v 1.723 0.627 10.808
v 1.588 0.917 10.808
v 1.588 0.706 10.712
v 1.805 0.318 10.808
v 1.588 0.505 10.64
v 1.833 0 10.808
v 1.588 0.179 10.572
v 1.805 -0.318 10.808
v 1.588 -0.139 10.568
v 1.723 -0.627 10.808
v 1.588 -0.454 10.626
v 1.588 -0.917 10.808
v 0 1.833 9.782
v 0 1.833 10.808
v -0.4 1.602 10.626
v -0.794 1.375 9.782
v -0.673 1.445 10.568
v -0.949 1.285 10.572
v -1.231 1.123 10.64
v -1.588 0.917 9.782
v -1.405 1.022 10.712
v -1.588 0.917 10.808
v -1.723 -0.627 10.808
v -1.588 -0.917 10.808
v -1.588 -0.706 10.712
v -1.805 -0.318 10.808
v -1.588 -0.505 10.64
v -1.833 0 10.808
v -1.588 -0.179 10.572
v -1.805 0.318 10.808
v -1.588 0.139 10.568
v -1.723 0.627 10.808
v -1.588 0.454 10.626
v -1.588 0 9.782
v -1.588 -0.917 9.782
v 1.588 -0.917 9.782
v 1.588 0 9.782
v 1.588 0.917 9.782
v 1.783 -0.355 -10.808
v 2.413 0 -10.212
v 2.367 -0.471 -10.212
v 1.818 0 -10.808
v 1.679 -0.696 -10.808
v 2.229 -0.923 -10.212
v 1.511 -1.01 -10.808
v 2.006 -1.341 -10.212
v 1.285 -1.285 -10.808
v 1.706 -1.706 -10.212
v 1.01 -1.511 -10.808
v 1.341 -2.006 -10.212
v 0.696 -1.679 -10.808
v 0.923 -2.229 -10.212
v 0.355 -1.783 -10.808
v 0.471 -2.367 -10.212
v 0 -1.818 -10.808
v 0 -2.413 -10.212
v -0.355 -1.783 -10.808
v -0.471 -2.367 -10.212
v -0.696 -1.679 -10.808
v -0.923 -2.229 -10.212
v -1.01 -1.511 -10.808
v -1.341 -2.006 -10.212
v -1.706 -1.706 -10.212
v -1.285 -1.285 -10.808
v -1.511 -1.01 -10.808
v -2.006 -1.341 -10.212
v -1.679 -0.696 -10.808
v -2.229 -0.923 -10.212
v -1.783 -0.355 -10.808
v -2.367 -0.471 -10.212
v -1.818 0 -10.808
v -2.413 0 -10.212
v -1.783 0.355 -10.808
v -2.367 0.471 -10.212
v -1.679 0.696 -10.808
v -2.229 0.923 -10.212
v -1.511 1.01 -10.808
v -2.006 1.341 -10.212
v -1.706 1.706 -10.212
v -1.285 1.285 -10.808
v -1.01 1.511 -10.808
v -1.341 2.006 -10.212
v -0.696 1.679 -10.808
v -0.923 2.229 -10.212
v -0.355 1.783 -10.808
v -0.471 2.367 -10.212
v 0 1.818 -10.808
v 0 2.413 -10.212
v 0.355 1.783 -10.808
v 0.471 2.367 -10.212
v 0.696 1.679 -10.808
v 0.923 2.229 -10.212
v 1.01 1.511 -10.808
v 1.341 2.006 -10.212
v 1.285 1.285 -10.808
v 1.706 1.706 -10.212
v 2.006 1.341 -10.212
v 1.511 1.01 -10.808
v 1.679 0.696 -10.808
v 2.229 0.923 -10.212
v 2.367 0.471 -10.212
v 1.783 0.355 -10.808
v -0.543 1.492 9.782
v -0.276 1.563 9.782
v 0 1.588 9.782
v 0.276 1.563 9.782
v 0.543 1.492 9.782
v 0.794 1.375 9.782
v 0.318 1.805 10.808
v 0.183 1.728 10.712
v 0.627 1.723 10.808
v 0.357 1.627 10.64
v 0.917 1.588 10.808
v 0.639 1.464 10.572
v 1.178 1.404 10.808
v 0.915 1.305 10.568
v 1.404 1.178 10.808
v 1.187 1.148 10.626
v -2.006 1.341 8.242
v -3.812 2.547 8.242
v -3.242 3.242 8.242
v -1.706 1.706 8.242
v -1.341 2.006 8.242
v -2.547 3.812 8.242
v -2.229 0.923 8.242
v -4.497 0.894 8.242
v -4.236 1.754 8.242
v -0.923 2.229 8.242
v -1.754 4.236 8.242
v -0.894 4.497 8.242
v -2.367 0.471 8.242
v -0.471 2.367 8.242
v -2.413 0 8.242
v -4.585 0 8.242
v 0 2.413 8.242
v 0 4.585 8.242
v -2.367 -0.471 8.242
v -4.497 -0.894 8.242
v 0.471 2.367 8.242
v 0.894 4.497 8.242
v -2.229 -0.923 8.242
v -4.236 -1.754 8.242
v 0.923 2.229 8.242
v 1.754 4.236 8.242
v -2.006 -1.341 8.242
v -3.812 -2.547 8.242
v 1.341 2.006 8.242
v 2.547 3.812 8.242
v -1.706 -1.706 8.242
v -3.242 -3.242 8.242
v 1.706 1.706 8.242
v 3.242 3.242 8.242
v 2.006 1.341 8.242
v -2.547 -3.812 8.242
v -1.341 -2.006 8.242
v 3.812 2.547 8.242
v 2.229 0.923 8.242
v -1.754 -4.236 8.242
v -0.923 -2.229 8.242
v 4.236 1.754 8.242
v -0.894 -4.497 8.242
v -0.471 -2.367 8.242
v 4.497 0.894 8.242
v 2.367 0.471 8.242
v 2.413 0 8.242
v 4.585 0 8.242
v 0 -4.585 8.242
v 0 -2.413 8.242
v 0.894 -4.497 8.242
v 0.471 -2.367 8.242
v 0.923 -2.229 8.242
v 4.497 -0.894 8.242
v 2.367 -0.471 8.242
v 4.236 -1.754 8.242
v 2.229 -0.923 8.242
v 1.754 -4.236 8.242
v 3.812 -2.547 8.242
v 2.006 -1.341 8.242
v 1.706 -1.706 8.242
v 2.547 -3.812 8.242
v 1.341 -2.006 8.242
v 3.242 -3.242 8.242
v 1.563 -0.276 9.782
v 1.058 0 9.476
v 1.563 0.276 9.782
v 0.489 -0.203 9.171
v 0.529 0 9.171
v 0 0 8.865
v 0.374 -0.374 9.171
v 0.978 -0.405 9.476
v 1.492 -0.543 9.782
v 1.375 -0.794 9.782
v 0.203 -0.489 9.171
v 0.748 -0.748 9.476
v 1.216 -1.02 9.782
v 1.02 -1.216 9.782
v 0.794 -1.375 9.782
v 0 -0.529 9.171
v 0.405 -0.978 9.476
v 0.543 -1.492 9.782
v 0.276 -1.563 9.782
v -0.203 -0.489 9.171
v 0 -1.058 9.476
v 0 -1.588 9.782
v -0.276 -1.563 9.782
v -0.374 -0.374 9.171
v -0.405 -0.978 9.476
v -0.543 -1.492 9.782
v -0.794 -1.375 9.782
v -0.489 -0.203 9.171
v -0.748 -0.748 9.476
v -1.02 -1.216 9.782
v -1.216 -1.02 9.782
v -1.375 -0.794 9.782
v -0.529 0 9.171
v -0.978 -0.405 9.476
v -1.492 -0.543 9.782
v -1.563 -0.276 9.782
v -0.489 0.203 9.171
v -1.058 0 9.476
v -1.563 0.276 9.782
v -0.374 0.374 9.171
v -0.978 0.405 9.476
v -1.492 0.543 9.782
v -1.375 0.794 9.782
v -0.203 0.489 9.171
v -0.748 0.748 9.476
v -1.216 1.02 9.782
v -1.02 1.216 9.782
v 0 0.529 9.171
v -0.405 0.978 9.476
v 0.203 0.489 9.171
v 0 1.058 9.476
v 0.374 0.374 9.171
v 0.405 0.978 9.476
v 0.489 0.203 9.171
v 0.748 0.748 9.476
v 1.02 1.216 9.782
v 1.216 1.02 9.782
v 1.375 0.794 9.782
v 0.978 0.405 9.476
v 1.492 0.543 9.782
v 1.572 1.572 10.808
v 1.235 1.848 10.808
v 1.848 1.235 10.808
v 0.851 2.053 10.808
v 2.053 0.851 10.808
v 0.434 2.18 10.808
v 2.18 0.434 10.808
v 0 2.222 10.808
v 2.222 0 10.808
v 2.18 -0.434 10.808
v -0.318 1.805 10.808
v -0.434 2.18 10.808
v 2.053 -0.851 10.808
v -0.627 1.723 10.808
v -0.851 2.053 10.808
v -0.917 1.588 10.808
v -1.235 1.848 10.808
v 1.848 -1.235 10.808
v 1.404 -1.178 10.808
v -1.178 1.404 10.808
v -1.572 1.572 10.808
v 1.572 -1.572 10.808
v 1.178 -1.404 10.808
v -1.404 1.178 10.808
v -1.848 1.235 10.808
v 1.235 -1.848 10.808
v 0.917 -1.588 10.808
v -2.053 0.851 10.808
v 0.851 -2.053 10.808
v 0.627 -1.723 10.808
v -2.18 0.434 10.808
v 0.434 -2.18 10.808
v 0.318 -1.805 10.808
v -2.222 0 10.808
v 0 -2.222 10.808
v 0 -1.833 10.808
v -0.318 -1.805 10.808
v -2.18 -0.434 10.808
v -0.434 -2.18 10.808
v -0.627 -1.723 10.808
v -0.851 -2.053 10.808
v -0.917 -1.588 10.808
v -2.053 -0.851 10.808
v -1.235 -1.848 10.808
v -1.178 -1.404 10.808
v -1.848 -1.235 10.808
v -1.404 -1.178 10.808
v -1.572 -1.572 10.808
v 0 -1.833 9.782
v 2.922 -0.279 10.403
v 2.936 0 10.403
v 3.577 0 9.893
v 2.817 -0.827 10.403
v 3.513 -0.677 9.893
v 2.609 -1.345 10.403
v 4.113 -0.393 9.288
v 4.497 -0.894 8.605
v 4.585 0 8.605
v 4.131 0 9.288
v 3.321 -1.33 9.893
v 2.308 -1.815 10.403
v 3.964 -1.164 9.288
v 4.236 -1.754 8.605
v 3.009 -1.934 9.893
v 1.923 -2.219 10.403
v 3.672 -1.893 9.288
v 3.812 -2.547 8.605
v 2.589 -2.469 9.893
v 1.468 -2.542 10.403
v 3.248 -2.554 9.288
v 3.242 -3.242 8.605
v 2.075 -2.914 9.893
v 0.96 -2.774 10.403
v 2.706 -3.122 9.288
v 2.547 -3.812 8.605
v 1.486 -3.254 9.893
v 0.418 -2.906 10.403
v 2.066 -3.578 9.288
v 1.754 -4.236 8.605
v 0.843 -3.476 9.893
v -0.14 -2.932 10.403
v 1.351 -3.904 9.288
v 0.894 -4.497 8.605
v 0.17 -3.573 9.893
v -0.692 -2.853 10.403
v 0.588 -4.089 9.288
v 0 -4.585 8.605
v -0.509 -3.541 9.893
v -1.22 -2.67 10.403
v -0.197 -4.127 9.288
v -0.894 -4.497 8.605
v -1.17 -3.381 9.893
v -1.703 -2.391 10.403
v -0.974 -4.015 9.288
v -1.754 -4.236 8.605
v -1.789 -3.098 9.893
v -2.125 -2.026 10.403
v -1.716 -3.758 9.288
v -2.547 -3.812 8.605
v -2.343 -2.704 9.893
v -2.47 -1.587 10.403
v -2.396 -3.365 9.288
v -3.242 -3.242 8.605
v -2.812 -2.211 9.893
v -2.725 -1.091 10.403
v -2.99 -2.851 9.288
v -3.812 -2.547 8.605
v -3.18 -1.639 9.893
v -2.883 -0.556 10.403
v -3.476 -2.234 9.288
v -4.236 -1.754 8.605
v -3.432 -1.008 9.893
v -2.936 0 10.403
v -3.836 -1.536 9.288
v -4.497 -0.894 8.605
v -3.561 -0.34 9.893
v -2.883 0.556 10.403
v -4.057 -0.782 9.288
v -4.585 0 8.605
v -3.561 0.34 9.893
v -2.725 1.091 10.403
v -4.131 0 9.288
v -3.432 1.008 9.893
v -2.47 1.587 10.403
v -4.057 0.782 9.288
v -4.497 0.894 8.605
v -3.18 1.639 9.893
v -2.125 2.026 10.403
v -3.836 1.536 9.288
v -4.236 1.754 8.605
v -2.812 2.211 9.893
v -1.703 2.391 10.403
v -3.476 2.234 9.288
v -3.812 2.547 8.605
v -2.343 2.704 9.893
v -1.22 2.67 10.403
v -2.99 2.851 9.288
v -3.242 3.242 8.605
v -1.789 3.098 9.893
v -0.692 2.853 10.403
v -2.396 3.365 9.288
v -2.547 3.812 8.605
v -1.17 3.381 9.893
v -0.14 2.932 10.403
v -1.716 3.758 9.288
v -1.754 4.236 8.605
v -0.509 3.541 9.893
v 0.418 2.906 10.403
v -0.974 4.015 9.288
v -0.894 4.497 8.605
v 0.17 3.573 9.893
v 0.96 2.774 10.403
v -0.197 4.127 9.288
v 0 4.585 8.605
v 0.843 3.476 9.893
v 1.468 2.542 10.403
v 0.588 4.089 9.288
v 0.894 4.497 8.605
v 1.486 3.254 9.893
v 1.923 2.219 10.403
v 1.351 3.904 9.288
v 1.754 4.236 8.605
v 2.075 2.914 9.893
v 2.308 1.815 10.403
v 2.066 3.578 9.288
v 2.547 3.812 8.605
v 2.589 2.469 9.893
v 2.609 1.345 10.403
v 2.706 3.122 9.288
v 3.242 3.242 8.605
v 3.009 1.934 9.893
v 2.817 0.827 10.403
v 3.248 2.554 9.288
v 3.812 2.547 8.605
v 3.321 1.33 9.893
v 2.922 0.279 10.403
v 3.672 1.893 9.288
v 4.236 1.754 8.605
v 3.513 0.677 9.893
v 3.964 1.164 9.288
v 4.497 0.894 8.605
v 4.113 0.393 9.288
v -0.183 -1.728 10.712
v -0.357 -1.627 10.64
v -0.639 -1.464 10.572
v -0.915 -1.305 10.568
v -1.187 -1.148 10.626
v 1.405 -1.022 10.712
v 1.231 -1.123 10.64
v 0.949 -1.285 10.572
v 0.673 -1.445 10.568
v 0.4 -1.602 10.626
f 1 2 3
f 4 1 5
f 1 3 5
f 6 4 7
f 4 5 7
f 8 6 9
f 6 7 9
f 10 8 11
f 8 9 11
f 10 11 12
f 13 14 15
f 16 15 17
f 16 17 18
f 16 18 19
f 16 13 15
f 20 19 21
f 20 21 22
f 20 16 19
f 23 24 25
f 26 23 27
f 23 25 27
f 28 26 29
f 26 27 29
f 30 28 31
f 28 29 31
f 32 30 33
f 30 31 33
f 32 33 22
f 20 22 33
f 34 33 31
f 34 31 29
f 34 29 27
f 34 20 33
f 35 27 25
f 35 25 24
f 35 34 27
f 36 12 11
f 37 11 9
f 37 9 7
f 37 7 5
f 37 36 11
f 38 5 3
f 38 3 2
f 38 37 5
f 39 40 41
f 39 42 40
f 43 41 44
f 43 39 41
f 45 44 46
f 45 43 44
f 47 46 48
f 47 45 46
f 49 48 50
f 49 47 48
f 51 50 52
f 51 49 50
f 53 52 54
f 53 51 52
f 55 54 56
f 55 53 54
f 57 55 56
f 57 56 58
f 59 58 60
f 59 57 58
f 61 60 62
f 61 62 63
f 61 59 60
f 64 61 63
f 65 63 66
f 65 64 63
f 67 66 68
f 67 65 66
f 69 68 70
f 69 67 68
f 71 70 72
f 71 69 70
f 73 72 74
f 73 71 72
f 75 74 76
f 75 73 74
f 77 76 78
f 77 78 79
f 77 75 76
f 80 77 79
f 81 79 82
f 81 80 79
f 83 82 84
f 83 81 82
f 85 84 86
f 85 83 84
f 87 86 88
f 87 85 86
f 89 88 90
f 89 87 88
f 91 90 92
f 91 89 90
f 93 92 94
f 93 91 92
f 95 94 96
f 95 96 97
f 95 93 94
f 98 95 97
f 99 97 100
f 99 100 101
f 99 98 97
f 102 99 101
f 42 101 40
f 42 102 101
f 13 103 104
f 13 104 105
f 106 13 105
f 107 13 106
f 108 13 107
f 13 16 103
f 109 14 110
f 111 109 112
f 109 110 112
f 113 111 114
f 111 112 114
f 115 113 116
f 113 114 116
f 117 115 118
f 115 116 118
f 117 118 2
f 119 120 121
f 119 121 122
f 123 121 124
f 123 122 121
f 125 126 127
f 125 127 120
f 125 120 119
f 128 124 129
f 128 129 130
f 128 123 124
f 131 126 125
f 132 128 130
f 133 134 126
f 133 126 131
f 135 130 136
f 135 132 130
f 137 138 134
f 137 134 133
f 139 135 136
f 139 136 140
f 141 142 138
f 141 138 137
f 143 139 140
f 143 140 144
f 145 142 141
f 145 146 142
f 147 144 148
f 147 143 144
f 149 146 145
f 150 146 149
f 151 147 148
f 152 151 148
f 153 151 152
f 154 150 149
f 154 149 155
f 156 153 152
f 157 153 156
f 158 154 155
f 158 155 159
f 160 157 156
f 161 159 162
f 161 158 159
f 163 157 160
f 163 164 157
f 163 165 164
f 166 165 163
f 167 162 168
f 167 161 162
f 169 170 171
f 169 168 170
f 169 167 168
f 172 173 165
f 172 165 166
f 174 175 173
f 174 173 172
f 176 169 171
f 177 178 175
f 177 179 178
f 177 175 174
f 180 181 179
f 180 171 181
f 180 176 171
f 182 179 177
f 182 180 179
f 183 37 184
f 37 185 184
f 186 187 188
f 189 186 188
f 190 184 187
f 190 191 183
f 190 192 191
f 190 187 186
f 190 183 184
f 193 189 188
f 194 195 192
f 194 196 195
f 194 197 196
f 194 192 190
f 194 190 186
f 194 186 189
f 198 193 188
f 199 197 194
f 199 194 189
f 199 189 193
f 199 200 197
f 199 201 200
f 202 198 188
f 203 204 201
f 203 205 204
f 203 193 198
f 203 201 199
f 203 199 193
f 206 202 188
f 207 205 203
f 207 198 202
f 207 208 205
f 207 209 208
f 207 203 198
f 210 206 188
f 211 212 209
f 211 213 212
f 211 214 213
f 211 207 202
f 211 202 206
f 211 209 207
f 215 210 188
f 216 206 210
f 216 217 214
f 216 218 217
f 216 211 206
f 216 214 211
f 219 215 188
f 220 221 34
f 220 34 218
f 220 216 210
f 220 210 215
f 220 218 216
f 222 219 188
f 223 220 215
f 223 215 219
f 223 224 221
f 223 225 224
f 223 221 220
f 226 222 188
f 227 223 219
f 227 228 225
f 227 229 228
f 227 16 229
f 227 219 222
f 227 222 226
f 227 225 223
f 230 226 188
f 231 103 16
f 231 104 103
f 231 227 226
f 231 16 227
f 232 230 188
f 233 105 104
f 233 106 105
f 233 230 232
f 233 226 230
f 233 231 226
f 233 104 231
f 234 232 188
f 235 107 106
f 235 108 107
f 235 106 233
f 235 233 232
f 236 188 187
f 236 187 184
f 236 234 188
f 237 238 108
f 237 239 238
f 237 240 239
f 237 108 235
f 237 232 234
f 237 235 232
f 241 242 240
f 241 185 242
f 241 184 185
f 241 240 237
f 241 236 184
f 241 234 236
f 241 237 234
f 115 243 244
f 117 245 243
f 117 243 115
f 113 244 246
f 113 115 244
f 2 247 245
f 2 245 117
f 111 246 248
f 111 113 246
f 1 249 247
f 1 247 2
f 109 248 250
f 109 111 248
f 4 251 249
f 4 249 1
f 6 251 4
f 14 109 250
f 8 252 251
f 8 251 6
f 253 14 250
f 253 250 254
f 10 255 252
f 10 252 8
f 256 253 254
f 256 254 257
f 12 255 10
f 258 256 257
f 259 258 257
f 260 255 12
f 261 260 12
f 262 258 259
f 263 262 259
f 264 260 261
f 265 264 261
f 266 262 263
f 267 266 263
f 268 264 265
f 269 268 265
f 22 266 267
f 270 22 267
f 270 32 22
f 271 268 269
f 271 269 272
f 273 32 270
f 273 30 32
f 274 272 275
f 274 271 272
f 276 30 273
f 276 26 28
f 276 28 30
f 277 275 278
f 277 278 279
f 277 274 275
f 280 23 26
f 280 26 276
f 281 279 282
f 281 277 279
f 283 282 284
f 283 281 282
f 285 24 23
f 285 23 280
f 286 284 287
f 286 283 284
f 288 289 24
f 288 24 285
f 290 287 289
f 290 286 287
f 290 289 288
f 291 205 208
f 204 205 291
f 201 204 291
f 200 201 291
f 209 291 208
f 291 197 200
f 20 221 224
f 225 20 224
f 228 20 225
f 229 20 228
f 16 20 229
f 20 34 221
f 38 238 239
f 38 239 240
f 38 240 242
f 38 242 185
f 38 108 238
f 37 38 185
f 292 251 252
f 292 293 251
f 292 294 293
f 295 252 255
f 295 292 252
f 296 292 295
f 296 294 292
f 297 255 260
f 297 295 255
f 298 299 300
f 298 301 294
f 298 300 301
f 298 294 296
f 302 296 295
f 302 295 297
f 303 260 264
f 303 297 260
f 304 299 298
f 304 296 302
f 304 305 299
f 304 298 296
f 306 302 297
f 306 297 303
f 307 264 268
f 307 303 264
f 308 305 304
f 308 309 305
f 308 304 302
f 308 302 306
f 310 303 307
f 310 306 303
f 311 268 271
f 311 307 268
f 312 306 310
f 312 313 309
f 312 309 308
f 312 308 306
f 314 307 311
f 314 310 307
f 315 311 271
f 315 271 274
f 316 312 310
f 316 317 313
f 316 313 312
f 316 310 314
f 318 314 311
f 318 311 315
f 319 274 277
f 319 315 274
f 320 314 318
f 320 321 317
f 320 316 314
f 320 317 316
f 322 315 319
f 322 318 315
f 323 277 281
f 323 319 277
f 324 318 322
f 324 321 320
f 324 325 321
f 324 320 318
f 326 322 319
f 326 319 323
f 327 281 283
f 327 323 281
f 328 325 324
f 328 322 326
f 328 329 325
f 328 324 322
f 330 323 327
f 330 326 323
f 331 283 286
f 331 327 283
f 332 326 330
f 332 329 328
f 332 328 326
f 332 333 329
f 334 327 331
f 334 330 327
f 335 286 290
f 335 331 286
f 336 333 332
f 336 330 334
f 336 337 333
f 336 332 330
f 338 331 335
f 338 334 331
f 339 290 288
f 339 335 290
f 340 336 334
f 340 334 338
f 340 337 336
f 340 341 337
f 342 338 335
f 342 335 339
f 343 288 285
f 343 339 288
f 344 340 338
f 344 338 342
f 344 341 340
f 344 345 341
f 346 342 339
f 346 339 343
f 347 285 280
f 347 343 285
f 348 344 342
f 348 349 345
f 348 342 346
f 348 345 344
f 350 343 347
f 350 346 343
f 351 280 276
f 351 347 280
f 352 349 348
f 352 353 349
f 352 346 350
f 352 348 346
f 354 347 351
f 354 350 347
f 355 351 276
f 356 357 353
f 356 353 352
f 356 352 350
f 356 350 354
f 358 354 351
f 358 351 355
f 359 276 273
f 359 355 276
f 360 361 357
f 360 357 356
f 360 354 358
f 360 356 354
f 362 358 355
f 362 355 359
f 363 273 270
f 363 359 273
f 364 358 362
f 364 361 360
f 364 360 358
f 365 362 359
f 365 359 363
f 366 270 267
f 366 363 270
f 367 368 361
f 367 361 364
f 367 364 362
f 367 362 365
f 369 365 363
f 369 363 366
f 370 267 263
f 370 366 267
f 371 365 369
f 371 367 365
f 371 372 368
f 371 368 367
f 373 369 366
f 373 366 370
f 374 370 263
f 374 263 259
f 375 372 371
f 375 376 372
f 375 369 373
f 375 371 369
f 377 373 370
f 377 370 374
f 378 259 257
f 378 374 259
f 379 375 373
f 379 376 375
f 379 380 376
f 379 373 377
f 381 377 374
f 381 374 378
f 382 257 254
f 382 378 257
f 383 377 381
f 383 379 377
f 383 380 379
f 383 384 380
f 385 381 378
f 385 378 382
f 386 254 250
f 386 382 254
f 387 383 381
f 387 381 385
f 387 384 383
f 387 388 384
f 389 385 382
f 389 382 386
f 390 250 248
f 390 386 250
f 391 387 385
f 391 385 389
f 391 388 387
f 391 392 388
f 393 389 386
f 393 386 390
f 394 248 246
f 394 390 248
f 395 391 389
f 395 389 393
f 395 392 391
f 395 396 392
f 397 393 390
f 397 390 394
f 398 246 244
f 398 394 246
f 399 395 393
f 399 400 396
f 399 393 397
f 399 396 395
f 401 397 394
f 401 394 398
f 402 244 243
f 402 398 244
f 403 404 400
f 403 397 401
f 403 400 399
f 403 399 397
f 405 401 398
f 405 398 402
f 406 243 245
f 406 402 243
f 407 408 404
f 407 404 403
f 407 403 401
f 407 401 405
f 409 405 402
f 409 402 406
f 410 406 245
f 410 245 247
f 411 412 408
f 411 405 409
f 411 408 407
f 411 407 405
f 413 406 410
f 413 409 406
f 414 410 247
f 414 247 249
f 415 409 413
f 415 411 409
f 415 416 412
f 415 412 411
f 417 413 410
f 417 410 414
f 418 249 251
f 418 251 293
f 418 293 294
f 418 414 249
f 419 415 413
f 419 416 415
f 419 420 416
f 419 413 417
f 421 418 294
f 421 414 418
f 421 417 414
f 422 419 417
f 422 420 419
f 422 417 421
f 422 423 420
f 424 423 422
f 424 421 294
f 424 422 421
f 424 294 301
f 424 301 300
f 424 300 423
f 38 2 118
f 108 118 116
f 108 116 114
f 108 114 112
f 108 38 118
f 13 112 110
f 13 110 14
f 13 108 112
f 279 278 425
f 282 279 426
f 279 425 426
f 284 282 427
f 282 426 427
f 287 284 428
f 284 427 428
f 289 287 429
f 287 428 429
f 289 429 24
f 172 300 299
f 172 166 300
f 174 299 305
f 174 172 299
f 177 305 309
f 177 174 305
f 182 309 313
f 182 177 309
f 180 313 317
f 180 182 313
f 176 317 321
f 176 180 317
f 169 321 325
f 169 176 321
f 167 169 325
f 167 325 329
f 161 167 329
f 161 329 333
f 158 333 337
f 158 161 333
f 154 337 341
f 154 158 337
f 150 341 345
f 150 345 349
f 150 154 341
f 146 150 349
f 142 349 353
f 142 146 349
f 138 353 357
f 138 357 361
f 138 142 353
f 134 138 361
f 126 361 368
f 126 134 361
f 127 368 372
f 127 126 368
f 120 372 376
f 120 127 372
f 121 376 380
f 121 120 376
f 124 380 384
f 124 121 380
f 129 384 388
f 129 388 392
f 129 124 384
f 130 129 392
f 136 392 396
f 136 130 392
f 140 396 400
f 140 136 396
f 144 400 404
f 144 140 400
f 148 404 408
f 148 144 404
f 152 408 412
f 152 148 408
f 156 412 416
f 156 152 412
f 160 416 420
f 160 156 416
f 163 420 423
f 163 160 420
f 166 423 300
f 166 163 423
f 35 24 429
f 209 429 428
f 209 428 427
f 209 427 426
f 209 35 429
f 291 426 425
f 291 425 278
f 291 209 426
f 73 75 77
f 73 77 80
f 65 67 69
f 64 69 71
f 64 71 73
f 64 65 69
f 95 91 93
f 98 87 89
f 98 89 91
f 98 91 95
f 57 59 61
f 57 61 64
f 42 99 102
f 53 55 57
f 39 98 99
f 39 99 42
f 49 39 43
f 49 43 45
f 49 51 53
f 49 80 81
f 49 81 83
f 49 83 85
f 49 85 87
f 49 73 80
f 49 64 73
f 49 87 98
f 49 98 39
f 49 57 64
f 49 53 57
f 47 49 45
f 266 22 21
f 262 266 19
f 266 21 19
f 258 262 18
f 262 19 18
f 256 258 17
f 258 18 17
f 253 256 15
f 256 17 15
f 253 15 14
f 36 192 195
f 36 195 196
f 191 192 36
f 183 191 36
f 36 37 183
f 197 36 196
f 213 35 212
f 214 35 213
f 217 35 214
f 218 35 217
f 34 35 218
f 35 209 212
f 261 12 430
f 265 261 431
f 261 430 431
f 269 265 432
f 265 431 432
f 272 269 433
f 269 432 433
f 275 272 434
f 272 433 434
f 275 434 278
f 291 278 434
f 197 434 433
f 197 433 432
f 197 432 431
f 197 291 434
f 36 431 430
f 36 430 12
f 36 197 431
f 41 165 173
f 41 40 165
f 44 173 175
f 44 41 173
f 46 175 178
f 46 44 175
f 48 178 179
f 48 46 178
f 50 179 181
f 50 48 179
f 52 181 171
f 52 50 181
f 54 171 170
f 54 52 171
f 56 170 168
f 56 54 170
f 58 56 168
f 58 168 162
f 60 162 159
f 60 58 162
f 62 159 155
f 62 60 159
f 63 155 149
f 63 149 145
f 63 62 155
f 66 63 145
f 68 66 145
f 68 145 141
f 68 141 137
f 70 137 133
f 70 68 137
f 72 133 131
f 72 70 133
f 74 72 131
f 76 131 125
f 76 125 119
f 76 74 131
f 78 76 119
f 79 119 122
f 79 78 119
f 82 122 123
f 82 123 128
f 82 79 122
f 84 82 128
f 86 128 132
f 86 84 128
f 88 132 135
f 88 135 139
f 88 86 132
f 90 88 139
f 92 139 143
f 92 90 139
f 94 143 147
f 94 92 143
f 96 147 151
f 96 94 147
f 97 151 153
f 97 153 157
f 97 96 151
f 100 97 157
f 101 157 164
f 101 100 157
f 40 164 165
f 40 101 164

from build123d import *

# Parameters (mm, degrees)
CUT_EXTRUDE1_START = 9.78154
CUT_EXTRUDE1_DEPTH = 3.821845556


with BuildPart() as part:
    # Sketch2 → Revolve1 (revolve)
    with BuildSketch(Plane(origin=(0, 0, 0), x_dir=(0, 0, -1), z_dir=(1, 0, 0)), mode=Mode.PRIVATE) as revolve1_sk:
        with BuildLine():
            Line((-10.8077, 1.5875), (-10.8077, 2.2225))
            ThreePointArc((-10.8077, 2.2225), (-9.892752118, 3.57733025), (-8.605157143, 4.5847))
            Line((-8.605157143, 4.5847), (-8.2423, 4.5847))
            Line((-8.2423, 4.5847), (-8.2423, 2.413))
            Line((-8.2423, 2.413), (10.2123875, 2.413))
            Line((10.2123875, 2.413), (10.8077, 1.8176875))
            Line((10.8077, 1.8176875), (10.8077, 0))
            Line((10.8077, 0), (-8.864996448, 0))
            Line((-8.864996448, 0), (-9.78154, 1.5875))
            Line((-9.78154, 1.5875), (-10.8077, 1.5875))
        make_face()
    revolve(revolve1_sk.sketch.rotate(Axis((0, 0, 10.8077), (0, 0, -1)), 90), axis=Axis((0, 0, 10.8077), (0, 0, -1)))

    # Sketch3 → Cut-Extrude1 (cut, through all)
    with BuildSketch(Plane.XY.offset(CUT_EXTRUDE1_START)):
        Polygon((0, 1.833087105), (-1.5875, 0.916543552), (-1.5875, -0.916543552), (0, -1.833087105), (1.5875, -0.916543552), (1.5875, 0.916543552), align=None)
    extrude(amount=CUT_EXTRUDE1_DEPTH, mode=Mode.SUBTRACT)

    # Cut-Extrude2 cone 1 section (through the dimple's axis) → Cut-Extrude2 (revolve, cut)
    with BuildSketch(Plane(origin=(0, 0, 10.8077), x_dir=(0, -1, 0), z_dir=(1, 0, 0))):
        Polygon((0, 0), (1.833087105, 0), (0, 1.833087105), align=None)
    revolve(axis=Axis((0, 0, 10.8077), (0, 0, -1)), mode=Mode.SUBTRACT)


solid = part.part
